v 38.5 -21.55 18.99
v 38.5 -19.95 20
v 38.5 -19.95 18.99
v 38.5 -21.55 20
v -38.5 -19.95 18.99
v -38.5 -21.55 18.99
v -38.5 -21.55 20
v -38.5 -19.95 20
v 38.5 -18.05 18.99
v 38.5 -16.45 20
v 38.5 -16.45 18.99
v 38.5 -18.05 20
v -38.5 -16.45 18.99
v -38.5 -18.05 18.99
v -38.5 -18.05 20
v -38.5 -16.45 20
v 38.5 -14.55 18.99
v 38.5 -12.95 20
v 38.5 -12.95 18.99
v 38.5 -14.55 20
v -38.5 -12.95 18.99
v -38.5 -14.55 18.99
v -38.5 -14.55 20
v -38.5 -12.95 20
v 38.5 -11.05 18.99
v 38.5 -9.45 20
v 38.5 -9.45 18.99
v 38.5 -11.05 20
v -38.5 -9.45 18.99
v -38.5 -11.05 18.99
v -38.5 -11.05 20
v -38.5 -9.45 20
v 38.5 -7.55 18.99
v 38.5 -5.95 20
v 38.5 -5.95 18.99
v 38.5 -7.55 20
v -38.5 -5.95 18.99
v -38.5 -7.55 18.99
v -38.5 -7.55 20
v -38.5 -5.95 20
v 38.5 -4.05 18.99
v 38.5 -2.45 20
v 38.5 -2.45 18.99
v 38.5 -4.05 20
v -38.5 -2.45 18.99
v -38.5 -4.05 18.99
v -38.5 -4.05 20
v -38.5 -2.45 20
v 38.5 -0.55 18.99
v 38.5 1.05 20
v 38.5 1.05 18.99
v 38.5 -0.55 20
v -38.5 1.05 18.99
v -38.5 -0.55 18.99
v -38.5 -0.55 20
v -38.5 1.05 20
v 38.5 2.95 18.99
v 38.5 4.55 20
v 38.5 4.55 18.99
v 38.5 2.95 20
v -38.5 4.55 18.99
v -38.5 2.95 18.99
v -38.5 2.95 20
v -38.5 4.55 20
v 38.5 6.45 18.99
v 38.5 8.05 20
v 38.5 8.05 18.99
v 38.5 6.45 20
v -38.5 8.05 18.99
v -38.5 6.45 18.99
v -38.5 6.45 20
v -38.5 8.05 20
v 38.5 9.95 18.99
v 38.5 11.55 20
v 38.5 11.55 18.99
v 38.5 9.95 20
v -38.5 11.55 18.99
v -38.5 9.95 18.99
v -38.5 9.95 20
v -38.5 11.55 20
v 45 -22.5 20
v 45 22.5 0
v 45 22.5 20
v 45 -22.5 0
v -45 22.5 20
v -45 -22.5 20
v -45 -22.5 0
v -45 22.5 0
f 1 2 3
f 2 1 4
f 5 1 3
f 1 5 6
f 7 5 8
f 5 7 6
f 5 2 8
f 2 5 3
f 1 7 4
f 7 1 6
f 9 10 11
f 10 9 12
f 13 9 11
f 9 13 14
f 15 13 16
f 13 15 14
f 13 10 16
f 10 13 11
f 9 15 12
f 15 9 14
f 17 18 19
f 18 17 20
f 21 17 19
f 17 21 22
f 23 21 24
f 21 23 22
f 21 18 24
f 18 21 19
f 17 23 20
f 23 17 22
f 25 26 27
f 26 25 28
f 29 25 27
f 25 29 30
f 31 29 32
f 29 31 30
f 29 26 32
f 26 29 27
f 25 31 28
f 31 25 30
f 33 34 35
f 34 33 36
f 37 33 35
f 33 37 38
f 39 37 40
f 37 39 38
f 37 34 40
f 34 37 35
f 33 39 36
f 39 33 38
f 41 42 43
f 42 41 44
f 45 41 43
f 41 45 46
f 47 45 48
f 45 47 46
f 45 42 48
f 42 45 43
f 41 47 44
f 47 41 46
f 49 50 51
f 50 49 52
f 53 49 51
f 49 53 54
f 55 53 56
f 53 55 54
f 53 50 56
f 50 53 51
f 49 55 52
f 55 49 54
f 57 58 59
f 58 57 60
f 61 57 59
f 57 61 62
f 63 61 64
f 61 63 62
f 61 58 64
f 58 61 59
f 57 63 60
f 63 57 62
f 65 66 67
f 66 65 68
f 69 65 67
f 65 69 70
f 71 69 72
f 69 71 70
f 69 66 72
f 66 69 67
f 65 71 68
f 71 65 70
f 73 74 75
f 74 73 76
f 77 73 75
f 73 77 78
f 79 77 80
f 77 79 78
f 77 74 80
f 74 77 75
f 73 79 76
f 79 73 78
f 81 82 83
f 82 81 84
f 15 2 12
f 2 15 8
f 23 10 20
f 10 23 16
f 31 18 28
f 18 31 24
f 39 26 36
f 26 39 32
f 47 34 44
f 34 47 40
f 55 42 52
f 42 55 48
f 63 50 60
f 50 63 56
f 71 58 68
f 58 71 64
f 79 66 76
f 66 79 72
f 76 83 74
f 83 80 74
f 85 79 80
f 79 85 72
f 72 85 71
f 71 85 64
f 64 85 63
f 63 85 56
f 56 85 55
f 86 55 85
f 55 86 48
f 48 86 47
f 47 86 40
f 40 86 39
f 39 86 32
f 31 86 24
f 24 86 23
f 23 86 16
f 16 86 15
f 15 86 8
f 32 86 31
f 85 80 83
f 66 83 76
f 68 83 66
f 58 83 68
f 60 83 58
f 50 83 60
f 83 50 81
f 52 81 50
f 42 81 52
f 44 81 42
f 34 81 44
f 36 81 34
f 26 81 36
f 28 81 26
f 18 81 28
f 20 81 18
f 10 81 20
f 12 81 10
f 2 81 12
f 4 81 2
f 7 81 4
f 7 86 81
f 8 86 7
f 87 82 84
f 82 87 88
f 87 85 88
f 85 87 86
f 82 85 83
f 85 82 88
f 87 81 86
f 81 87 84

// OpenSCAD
// Drying rack for 10 microscope slides, standing upright on their long edge
// Print orientation: base block rests on XY plane, slots open at top (+Z)

$fn = 64;

// ---- Block dimensions ----
block_x = 90;        // block length (X)
block_y = 45;        // block width (Y)
block_z = 20;        // block height (Z)

// ---- Slot dimensions ----
slot_len   = 77;     // slot length along X
slot_w     = 1.6;    // slot width along Y
slot_depth = 10;     // slot depth from top face (Z)

// ---- Layout ----
slot_count = 10;     // number of slots
slot_pitch = 3.5;    // centre-to-centre spacing in Y
overlap    = 0.01;   // small overlap so cutters pass through the top face

// ---- Derived ----
total_y     = block_y;                          // group of slots spans full width
y_first     = -total_y / 2 + slot_pitch / 2;    // first slot centre (from below)
y_last      =  total_y / 2 - slot_pitch / 2;    // last slot centre (from below)
cut_extra   = overlap;                          // extension of cutters past top face

// ---- Model ----
difference() {
    // Solid base block, centred in X and Y, sitting on z = 0
    translate([-block_x / 2, -block_y / 2, 0])
        cube([block_x, block_y, block_z]);

    // 10 parallel slots, open at top, centred on block in X and Y
    for (i = [0 : slot_count - 1])
        translate([0, y_first + i * slot_pitch, block_z - cut_extra])
            translate([-slot_len / 2, -slot_w / 2, -1])
                cube([slot_len, slot_w, slot_depth + cut_extra]);
}
